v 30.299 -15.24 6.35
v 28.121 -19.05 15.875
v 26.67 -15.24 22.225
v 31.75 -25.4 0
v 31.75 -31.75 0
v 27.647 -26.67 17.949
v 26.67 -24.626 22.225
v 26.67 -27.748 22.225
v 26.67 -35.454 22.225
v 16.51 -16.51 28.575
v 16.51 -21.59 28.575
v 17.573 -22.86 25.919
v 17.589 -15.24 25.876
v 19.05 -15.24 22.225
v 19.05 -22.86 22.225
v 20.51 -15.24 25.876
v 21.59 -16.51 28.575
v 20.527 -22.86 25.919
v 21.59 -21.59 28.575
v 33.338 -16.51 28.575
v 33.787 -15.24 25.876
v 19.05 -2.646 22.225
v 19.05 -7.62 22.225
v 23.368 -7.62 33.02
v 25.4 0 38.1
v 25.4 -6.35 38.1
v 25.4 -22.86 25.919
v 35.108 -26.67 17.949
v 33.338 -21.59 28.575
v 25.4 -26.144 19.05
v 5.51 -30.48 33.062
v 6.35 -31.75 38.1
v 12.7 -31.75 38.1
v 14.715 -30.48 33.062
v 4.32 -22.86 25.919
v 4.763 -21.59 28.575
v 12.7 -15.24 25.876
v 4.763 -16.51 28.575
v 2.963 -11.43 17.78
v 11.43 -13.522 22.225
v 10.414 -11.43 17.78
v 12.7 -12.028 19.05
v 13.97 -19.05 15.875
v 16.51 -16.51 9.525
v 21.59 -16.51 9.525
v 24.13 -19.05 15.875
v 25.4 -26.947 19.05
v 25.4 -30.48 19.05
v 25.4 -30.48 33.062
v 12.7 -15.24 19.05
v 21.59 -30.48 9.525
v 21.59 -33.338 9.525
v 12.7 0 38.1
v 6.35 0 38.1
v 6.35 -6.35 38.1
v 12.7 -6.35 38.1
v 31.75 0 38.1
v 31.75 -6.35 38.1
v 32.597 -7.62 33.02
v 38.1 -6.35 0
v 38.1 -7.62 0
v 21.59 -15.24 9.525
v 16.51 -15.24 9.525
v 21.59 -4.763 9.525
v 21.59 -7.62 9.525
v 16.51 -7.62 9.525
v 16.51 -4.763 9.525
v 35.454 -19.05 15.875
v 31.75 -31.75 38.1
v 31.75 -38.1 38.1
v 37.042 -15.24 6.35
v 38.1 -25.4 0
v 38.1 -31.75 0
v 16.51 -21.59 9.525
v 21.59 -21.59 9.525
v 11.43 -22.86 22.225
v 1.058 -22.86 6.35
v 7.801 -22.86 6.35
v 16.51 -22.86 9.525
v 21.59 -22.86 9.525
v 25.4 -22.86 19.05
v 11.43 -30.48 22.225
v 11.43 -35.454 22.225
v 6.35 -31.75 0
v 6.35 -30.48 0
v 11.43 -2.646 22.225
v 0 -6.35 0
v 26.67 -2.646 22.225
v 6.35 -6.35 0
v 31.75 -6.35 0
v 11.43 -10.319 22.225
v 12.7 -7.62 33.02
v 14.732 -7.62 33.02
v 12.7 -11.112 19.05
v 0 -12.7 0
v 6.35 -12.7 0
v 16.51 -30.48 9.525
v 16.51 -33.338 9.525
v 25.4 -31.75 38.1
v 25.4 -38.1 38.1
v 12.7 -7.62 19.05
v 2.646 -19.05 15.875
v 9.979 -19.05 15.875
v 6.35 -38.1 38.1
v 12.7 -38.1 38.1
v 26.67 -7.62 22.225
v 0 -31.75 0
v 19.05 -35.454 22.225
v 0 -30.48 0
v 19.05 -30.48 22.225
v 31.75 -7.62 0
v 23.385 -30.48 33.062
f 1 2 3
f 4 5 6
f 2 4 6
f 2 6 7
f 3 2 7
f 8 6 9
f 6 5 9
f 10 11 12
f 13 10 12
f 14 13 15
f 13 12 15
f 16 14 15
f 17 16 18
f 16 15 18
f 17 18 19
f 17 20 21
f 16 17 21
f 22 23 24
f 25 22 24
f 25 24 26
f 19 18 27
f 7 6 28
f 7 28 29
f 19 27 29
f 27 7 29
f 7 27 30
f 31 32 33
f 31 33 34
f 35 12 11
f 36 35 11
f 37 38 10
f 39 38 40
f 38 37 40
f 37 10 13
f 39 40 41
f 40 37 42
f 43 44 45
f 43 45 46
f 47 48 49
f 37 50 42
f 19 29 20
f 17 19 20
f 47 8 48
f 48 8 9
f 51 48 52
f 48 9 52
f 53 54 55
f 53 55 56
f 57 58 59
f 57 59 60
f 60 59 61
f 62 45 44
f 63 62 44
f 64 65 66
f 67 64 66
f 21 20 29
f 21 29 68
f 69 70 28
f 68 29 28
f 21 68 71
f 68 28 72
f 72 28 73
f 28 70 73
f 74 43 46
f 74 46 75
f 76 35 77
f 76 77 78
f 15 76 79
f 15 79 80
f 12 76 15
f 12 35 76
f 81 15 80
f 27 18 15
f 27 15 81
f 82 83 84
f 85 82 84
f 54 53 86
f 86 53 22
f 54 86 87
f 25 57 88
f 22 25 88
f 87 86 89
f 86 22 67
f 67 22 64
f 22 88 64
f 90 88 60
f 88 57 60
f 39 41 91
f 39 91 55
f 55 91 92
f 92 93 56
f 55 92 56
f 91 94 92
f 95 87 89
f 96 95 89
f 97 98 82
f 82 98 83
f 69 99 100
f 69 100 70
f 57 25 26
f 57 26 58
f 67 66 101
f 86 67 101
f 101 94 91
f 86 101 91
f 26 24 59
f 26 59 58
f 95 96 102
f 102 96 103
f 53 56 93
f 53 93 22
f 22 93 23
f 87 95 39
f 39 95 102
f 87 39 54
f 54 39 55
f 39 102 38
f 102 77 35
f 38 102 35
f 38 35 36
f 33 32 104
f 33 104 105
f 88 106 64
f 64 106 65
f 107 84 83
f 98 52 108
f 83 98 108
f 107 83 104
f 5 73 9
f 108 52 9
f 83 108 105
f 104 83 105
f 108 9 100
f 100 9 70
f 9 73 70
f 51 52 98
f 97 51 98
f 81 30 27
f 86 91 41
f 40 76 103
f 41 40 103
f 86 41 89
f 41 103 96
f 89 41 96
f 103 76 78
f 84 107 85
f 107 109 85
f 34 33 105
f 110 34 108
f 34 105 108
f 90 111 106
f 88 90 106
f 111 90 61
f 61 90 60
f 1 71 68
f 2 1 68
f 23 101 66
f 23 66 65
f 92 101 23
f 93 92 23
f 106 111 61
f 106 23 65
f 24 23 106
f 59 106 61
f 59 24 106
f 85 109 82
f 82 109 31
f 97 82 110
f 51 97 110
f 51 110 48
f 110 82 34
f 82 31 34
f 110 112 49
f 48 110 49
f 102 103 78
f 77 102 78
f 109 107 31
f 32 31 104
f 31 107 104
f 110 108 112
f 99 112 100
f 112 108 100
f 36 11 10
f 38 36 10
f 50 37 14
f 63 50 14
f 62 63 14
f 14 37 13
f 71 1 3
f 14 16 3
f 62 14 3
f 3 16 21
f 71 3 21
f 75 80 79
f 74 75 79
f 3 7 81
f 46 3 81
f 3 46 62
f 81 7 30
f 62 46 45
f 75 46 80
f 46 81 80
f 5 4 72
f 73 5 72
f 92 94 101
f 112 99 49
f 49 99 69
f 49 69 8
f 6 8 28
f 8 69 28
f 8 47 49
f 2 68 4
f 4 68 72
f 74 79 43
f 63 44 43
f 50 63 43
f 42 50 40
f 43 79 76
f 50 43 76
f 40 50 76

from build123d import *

# Parameters (mm, degrees)
F0_W      = 38.1
F0_H      = 38.1
F1_DEPTH  = 38.1
F6_DEPTH  = 38.1
F8_DEPTH  = 38.1
F9_W      = 25.4
F9_H      = 7.62
F10_DEPTH = 38.1
F11_W     = 25.4
F11_H     = 7.62
F12_DEPTH = 38.1


with BuildPart() as f1:
    # F0 (on Front) → F1 (new body)
    with BuildSketch(Plane.XZ):
        with Locations((19.05, 19.05)):
            Rectangle(F0_W, F0_H)
    extrude(amount=F1_DEPTH)

    # F5 (on offset) → F6 (cut)
    with BuildSketch(Plane.YZ.offset(38.1)):
        Polygon((-31.75, 0), (-38.1, 38.1), (-38.1, 0), align=None)
        Polygon((-19.05, 15.875), (-25.4, 0), (-12.7, 0), align=None)
        Polygon((0, 0), (0, 38.1), (-6.35, 0), align=None)
        Polygon((-6.35, 38.1), (-31.75, 38.1), (-26.67, 17.949333), (-21.59, 28.575), (-16.51, 28.575), (-11.43, 17.78), align=None)
    extrude(amount=-F6_DEPTH, mode=Mode.SUBTRACT)

    # F7 (on offset) → F8 (cut)
    with BuildSketch(Plane.XZ.offset(38.1)):
        Polygon((25.4, 38.1), (12.7, 38.1), (19.05, 22.225), align=None)
        Polygon((6.35, 38.1), (0, 38.1), (0, 0), align=None)
        Polygon((11.43, 22.225), (6.35, 0), (31.75, 0), (26.67, 22.225), (21.59, 9.525), (16.51, 9.525), align=None)
        Polygon((38.1, 38.1), (31.75, 38.1), (38.1, 0), align=None)
    extrude(amount=-F8_DEPTH, mode=Mode.SUBTRACT)

    # F9 (on Top) → F10 (cut)
    with BuildSketch(Plane.XY):
        with Locations((12.7, -26.67)):
            Rectangle(F9_W, F9_H)
        with Locations((25.4, -11.43)):
            Rectangle(F9_W, F9_H)
    extrude(amount=-F10_DEPTH, mode=Mode.SUBTRACT)

    # F11 (on offset) → F12 (cut)
    with BuildSketch(Plane.XY.offset(38.1)):
        with Locations((12.7, -26.67)):
            Rectangle(F11_W, F11_H)
        with Locations((25.4, -11.43)):
            Rectangle(F11_W, F11_H)
    extrude(amount=-F12_DEPTH, mode=Mode.SUBTRACT)


solid = f1.part
